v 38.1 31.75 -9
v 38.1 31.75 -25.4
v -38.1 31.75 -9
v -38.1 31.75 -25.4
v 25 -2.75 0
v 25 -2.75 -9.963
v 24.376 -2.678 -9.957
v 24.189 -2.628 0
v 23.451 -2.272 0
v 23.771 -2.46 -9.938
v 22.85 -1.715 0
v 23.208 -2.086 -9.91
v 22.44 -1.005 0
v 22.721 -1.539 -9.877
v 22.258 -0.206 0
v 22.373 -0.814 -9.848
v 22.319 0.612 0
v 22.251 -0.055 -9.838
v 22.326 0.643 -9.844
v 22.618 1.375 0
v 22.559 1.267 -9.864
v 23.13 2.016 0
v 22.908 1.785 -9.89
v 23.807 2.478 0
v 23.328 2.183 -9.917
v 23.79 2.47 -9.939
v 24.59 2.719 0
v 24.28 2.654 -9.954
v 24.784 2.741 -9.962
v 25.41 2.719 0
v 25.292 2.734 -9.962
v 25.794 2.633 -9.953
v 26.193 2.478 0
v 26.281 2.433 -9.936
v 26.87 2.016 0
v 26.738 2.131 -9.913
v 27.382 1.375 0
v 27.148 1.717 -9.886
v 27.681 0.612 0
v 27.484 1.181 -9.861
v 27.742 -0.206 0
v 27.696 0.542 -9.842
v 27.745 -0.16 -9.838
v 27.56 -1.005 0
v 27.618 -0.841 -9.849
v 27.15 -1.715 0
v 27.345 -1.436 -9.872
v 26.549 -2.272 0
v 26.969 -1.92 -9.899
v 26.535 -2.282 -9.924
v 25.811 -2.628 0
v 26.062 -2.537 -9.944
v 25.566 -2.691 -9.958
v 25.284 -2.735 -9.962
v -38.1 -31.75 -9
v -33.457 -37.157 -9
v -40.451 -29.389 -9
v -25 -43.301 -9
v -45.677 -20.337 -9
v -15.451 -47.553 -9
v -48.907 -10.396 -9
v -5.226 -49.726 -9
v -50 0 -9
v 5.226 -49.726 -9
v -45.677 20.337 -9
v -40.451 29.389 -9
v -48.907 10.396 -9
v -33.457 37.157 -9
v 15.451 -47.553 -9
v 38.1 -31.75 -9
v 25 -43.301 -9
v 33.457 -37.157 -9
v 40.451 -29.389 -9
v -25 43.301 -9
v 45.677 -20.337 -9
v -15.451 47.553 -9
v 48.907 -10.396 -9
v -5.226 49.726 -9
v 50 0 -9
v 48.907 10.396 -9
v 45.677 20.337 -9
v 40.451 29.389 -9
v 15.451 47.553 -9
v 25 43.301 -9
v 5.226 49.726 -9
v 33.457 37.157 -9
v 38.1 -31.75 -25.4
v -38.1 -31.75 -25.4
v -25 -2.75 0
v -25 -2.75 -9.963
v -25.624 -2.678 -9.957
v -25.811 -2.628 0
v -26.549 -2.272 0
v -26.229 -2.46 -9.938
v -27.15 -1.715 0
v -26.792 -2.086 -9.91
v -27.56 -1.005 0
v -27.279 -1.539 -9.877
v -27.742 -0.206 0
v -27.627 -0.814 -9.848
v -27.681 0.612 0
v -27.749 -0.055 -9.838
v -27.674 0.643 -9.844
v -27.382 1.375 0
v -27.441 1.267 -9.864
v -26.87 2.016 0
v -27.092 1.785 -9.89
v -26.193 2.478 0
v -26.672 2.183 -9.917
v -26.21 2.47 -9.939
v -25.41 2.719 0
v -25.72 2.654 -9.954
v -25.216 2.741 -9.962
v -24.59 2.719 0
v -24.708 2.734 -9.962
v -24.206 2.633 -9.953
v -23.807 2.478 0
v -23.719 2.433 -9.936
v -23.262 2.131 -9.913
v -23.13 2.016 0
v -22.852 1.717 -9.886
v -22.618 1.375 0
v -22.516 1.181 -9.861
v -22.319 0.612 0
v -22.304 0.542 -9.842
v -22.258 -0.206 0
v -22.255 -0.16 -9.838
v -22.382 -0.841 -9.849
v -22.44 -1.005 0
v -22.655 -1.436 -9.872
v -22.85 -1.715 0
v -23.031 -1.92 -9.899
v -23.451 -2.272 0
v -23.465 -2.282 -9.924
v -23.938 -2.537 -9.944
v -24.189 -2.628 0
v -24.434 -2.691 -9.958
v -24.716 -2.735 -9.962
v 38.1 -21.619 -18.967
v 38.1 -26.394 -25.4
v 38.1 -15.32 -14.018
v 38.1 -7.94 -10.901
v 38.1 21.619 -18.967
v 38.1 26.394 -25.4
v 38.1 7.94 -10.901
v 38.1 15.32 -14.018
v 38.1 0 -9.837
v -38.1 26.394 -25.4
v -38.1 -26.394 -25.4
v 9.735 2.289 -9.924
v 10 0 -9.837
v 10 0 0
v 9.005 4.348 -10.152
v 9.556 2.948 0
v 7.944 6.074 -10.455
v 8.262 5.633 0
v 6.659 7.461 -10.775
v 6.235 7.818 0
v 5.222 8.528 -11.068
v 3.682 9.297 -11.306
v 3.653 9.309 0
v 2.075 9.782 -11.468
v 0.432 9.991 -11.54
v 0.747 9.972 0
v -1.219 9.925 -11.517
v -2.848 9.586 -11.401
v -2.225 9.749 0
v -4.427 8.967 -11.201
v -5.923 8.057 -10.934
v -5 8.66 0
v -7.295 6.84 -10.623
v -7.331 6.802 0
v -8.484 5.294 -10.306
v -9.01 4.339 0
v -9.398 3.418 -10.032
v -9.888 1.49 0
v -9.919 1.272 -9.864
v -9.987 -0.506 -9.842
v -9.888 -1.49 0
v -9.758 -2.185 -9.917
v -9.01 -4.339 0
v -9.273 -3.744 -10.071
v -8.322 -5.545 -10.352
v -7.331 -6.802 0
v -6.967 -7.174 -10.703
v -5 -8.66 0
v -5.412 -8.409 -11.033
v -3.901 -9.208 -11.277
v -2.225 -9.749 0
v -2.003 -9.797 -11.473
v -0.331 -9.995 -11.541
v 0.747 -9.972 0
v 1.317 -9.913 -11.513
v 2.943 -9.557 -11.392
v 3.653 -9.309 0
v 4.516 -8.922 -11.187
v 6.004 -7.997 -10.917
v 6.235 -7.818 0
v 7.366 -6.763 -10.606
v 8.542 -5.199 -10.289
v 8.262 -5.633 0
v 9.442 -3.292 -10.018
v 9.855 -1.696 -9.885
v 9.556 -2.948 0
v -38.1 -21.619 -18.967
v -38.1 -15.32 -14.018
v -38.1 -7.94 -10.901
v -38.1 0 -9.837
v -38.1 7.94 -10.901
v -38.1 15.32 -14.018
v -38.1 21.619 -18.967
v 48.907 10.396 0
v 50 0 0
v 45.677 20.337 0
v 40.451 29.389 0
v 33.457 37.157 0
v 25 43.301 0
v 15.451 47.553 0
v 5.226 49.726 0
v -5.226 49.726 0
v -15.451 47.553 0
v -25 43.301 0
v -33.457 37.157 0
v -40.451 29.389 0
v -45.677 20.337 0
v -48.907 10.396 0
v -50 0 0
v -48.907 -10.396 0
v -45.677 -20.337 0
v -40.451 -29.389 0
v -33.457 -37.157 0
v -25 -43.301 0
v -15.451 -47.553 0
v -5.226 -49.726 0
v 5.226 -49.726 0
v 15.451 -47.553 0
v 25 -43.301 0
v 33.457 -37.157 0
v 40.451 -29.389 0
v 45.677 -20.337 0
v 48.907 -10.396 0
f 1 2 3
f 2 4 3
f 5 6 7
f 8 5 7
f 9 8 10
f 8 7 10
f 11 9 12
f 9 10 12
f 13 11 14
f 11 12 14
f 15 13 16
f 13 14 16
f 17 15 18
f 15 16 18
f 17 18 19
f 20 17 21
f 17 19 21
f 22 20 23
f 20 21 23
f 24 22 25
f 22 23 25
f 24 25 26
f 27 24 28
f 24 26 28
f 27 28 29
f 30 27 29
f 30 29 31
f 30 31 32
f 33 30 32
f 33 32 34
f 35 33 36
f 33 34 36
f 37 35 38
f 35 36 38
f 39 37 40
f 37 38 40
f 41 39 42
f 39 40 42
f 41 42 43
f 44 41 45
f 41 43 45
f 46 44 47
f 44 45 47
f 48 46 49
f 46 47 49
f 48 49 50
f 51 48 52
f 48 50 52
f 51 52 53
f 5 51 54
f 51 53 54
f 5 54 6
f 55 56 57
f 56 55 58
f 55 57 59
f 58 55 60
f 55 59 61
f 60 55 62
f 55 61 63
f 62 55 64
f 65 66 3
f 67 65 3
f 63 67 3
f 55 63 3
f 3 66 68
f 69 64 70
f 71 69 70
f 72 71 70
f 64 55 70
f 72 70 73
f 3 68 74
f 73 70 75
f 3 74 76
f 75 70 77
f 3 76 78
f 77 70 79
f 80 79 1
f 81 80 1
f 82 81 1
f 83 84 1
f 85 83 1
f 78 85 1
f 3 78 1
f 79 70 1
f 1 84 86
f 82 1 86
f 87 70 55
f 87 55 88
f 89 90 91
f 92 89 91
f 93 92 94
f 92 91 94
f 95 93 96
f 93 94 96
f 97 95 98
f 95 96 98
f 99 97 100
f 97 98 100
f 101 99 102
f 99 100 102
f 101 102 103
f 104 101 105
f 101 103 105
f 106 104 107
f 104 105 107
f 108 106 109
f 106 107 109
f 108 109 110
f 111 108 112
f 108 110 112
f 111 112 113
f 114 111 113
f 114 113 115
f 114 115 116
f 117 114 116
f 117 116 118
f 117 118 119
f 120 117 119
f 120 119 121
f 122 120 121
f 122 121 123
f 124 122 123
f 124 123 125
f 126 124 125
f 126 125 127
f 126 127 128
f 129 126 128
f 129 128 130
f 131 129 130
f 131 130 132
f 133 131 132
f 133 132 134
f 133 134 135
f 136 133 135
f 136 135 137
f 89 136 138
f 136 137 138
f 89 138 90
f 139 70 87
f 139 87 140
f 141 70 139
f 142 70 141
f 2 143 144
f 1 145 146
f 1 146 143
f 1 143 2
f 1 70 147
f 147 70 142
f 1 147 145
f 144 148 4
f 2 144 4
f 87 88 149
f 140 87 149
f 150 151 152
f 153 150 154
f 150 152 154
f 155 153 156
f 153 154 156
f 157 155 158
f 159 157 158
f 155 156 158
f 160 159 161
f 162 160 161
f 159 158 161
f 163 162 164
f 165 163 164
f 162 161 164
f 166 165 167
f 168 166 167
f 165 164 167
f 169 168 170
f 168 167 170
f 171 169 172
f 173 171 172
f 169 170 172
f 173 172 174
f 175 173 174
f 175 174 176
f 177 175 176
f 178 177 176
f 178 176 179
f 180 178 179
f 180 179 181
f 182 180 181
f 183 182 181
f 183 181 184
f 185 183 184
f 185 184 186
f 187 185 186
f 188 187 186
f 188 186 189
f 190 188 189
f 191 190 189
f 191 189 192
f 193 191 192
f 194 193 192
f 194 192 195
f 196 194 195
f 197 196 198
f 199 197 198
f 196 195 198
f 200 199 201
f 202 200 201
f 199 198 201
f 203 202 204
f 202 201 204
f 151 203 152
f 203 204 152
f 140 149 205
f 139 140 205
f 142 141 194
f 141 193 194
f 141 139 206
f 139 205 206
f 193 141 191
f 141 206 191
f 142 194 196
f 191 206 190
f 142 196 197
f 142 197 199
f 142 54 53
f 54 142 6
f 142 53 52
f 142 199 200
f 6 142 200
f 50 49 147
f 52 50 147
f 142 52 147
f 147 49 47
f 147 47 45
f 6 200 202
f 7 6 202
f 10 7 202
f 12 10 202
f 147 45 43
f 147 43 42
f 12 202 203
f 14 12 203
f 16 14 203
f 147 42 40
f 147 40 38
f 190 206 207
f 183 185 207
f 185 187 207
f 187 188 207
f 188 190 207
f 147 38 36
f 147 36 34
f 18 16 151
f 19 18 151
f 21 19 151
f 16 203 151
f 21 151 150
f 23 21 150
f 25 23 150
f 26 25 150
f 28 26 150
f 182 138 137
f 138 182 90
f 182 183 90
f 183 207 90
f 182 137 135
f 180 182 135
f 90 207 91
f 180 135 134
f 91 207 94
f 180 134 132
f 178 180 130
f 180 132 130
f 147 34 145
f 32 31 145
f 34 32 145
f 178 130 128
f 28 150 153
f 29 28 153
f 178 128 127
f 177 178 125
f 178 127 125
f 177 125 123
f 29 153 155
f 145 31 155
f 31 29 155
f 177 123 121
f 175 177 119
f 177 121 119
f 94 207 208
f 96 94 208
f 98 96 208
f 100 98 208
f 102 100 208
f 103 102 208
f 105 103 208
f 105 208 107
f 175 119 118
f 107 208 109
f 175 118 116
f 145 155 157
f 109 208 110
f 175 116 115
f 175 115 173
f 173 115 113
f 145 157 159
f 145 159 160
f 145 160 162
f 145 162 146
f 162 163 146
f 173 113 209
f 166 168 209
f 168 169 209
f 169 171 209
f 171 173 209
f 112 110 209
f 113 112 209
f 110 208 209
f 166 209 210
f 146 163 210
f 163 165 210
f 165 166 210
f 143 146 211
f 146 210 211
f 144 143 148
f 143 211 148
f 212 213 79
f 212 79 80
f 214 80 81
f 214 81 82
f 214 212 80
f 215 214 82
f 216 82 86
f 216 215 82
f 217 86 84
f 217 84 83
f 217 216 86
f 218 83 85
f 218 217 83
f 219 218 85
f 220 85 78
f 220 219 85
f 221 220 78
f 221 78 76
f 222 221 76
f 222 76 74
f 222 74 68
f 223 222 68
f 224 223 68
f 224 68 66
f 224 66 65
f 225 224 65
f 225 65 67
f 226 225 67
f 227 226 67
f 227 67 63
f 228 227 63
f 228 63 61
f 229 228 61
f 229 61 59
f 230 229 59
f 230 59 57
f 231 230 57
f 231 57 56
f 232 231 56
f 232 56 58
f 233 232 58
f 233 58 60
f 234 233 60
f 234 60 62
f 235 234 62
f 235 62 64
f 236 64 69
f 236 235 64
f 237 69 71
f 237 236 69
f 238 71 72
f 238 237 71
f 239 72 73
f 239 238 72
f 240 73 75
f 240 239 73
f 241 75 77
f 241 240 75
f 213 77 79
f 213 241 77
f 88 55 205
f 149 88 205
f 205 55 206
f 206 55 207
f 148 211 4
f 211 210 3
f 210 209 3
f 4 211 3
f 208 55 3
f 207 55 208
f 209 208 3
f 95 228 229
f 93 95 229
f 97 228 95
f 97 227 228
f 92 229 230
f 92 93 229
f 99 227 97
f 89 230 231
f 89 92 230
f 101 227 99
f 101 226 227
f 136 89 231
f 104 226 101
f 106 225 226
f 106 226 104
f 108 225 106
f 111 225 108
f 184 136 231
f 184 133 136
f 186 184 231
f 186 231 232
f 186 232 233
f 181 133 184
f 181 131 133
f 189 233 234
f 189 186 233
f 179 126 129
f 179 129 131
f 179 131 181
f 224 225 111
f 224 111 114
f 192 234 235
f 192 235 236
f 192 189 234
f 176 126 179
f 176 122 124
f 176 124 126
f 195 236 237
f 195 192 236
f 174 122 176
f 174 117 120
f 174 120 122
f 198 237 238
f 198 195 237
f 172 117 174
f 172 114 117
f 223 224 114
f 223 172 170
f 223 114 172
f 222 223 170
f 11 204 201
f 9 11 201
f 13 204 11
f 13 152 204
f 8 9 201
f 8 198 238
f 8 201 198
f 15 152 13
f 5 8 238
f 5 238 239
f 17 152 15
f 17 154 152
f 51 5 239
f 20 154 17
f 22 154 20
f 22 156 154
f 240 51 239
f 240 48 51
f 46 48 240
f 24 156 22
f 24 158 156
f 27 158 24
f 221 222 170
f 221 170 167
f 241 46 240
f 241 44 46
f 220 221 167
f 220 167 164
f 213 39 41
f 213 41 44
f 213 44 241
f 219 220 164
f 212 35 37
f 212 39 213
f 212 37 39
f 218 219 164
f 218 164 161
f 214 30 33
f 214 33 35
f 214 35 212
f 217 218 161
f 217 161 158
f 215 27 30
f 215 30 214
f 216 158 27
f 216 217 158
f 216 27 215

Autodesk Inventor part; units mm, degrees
ref_plane "YZ Plane" through (0, 0, 0) normal (1, 0, 0) x (0, 1, 0)
ref_plane "XZ Plane" through (0, 0, 0) normal (0, 1, 0) x (-1, 0, 0)
ref_plane "XY Plane" through (0, 0, 0) normal (0, 0, 1) x (1, 0, 0)
sketch "Sketch1" plane through (0, 0, 0) normal (1, 0, 0) x (0, 1, 0)
  circle A0 centre (0, -40) radius 30.1625 construction
  line L0 (31.75, 0) -> (-31.75, 0)
  line L1 (-31.75, 0) -> (-31.75, -25.4)
  line L2 (31.75, -25.4) -> (31.75, 0)
  line L3 (0, 0) -> (0, -115.458)
  arc A1 (26.3935, -25.4) -> (-26.3935, -25.4) centre (0, -40) ccw
  line L4 (-31.75, -25.4) -> (-26.3935, -25.4)
  line L5 (26.3935, -25.4) -> (31.75, -25.4)
  dimension "d1" = 60.325
  dimension "d3" = 63.5
  dimension "d4" = 40
  dimension "d5" = 25.4
extrude "Extrusion1" add sketch "Sketch1" along normal mid plane 76.2
sketch "Sketch2" plane through (-38.1, -31.75, 0) normal (0, 0, 1) x (1, 0, 0)
  circle A0 centre (38.1, 31.75) radius 50
  dimension "d8" = 100
extrude "Extrusion2" add sketch "Sketch2" against normal blind 9
sketch "Sketch3" plane through (0, 0, 0) normal (0, 0, 1) x (1, 0, 0)
  circle A0 centre (0, 0) radius 10
  dimension "d11" = 20
extrude "Extrusion3" cut sketch "Sketch3" against normal through all
sketch "Sketch5" plane through (0, 0, 0) normal (0, 0, 1) x (1, 0, 0)
  line L0 (0, 0) -> (0, 29.874) construction
  line L1 (-38.1, 26.3935) -> (38.1, 26.3935) construction
  point P0 (25, 0)
  point P1 (-25, 0)
  point P2 (-25, 0)
  point P3 (25, 0)
  dimension "d23" = 50
hole "Hole1" at (25, 0, 0) at (-25, 0, 0) direction (0, 0, -1) diameter 5.5 end through all clearance for "Hex Head Cap Screw ISO 24017" size "M5" standard "ISO"
properties part number "Hub Plate" material "ABS Plastic"
